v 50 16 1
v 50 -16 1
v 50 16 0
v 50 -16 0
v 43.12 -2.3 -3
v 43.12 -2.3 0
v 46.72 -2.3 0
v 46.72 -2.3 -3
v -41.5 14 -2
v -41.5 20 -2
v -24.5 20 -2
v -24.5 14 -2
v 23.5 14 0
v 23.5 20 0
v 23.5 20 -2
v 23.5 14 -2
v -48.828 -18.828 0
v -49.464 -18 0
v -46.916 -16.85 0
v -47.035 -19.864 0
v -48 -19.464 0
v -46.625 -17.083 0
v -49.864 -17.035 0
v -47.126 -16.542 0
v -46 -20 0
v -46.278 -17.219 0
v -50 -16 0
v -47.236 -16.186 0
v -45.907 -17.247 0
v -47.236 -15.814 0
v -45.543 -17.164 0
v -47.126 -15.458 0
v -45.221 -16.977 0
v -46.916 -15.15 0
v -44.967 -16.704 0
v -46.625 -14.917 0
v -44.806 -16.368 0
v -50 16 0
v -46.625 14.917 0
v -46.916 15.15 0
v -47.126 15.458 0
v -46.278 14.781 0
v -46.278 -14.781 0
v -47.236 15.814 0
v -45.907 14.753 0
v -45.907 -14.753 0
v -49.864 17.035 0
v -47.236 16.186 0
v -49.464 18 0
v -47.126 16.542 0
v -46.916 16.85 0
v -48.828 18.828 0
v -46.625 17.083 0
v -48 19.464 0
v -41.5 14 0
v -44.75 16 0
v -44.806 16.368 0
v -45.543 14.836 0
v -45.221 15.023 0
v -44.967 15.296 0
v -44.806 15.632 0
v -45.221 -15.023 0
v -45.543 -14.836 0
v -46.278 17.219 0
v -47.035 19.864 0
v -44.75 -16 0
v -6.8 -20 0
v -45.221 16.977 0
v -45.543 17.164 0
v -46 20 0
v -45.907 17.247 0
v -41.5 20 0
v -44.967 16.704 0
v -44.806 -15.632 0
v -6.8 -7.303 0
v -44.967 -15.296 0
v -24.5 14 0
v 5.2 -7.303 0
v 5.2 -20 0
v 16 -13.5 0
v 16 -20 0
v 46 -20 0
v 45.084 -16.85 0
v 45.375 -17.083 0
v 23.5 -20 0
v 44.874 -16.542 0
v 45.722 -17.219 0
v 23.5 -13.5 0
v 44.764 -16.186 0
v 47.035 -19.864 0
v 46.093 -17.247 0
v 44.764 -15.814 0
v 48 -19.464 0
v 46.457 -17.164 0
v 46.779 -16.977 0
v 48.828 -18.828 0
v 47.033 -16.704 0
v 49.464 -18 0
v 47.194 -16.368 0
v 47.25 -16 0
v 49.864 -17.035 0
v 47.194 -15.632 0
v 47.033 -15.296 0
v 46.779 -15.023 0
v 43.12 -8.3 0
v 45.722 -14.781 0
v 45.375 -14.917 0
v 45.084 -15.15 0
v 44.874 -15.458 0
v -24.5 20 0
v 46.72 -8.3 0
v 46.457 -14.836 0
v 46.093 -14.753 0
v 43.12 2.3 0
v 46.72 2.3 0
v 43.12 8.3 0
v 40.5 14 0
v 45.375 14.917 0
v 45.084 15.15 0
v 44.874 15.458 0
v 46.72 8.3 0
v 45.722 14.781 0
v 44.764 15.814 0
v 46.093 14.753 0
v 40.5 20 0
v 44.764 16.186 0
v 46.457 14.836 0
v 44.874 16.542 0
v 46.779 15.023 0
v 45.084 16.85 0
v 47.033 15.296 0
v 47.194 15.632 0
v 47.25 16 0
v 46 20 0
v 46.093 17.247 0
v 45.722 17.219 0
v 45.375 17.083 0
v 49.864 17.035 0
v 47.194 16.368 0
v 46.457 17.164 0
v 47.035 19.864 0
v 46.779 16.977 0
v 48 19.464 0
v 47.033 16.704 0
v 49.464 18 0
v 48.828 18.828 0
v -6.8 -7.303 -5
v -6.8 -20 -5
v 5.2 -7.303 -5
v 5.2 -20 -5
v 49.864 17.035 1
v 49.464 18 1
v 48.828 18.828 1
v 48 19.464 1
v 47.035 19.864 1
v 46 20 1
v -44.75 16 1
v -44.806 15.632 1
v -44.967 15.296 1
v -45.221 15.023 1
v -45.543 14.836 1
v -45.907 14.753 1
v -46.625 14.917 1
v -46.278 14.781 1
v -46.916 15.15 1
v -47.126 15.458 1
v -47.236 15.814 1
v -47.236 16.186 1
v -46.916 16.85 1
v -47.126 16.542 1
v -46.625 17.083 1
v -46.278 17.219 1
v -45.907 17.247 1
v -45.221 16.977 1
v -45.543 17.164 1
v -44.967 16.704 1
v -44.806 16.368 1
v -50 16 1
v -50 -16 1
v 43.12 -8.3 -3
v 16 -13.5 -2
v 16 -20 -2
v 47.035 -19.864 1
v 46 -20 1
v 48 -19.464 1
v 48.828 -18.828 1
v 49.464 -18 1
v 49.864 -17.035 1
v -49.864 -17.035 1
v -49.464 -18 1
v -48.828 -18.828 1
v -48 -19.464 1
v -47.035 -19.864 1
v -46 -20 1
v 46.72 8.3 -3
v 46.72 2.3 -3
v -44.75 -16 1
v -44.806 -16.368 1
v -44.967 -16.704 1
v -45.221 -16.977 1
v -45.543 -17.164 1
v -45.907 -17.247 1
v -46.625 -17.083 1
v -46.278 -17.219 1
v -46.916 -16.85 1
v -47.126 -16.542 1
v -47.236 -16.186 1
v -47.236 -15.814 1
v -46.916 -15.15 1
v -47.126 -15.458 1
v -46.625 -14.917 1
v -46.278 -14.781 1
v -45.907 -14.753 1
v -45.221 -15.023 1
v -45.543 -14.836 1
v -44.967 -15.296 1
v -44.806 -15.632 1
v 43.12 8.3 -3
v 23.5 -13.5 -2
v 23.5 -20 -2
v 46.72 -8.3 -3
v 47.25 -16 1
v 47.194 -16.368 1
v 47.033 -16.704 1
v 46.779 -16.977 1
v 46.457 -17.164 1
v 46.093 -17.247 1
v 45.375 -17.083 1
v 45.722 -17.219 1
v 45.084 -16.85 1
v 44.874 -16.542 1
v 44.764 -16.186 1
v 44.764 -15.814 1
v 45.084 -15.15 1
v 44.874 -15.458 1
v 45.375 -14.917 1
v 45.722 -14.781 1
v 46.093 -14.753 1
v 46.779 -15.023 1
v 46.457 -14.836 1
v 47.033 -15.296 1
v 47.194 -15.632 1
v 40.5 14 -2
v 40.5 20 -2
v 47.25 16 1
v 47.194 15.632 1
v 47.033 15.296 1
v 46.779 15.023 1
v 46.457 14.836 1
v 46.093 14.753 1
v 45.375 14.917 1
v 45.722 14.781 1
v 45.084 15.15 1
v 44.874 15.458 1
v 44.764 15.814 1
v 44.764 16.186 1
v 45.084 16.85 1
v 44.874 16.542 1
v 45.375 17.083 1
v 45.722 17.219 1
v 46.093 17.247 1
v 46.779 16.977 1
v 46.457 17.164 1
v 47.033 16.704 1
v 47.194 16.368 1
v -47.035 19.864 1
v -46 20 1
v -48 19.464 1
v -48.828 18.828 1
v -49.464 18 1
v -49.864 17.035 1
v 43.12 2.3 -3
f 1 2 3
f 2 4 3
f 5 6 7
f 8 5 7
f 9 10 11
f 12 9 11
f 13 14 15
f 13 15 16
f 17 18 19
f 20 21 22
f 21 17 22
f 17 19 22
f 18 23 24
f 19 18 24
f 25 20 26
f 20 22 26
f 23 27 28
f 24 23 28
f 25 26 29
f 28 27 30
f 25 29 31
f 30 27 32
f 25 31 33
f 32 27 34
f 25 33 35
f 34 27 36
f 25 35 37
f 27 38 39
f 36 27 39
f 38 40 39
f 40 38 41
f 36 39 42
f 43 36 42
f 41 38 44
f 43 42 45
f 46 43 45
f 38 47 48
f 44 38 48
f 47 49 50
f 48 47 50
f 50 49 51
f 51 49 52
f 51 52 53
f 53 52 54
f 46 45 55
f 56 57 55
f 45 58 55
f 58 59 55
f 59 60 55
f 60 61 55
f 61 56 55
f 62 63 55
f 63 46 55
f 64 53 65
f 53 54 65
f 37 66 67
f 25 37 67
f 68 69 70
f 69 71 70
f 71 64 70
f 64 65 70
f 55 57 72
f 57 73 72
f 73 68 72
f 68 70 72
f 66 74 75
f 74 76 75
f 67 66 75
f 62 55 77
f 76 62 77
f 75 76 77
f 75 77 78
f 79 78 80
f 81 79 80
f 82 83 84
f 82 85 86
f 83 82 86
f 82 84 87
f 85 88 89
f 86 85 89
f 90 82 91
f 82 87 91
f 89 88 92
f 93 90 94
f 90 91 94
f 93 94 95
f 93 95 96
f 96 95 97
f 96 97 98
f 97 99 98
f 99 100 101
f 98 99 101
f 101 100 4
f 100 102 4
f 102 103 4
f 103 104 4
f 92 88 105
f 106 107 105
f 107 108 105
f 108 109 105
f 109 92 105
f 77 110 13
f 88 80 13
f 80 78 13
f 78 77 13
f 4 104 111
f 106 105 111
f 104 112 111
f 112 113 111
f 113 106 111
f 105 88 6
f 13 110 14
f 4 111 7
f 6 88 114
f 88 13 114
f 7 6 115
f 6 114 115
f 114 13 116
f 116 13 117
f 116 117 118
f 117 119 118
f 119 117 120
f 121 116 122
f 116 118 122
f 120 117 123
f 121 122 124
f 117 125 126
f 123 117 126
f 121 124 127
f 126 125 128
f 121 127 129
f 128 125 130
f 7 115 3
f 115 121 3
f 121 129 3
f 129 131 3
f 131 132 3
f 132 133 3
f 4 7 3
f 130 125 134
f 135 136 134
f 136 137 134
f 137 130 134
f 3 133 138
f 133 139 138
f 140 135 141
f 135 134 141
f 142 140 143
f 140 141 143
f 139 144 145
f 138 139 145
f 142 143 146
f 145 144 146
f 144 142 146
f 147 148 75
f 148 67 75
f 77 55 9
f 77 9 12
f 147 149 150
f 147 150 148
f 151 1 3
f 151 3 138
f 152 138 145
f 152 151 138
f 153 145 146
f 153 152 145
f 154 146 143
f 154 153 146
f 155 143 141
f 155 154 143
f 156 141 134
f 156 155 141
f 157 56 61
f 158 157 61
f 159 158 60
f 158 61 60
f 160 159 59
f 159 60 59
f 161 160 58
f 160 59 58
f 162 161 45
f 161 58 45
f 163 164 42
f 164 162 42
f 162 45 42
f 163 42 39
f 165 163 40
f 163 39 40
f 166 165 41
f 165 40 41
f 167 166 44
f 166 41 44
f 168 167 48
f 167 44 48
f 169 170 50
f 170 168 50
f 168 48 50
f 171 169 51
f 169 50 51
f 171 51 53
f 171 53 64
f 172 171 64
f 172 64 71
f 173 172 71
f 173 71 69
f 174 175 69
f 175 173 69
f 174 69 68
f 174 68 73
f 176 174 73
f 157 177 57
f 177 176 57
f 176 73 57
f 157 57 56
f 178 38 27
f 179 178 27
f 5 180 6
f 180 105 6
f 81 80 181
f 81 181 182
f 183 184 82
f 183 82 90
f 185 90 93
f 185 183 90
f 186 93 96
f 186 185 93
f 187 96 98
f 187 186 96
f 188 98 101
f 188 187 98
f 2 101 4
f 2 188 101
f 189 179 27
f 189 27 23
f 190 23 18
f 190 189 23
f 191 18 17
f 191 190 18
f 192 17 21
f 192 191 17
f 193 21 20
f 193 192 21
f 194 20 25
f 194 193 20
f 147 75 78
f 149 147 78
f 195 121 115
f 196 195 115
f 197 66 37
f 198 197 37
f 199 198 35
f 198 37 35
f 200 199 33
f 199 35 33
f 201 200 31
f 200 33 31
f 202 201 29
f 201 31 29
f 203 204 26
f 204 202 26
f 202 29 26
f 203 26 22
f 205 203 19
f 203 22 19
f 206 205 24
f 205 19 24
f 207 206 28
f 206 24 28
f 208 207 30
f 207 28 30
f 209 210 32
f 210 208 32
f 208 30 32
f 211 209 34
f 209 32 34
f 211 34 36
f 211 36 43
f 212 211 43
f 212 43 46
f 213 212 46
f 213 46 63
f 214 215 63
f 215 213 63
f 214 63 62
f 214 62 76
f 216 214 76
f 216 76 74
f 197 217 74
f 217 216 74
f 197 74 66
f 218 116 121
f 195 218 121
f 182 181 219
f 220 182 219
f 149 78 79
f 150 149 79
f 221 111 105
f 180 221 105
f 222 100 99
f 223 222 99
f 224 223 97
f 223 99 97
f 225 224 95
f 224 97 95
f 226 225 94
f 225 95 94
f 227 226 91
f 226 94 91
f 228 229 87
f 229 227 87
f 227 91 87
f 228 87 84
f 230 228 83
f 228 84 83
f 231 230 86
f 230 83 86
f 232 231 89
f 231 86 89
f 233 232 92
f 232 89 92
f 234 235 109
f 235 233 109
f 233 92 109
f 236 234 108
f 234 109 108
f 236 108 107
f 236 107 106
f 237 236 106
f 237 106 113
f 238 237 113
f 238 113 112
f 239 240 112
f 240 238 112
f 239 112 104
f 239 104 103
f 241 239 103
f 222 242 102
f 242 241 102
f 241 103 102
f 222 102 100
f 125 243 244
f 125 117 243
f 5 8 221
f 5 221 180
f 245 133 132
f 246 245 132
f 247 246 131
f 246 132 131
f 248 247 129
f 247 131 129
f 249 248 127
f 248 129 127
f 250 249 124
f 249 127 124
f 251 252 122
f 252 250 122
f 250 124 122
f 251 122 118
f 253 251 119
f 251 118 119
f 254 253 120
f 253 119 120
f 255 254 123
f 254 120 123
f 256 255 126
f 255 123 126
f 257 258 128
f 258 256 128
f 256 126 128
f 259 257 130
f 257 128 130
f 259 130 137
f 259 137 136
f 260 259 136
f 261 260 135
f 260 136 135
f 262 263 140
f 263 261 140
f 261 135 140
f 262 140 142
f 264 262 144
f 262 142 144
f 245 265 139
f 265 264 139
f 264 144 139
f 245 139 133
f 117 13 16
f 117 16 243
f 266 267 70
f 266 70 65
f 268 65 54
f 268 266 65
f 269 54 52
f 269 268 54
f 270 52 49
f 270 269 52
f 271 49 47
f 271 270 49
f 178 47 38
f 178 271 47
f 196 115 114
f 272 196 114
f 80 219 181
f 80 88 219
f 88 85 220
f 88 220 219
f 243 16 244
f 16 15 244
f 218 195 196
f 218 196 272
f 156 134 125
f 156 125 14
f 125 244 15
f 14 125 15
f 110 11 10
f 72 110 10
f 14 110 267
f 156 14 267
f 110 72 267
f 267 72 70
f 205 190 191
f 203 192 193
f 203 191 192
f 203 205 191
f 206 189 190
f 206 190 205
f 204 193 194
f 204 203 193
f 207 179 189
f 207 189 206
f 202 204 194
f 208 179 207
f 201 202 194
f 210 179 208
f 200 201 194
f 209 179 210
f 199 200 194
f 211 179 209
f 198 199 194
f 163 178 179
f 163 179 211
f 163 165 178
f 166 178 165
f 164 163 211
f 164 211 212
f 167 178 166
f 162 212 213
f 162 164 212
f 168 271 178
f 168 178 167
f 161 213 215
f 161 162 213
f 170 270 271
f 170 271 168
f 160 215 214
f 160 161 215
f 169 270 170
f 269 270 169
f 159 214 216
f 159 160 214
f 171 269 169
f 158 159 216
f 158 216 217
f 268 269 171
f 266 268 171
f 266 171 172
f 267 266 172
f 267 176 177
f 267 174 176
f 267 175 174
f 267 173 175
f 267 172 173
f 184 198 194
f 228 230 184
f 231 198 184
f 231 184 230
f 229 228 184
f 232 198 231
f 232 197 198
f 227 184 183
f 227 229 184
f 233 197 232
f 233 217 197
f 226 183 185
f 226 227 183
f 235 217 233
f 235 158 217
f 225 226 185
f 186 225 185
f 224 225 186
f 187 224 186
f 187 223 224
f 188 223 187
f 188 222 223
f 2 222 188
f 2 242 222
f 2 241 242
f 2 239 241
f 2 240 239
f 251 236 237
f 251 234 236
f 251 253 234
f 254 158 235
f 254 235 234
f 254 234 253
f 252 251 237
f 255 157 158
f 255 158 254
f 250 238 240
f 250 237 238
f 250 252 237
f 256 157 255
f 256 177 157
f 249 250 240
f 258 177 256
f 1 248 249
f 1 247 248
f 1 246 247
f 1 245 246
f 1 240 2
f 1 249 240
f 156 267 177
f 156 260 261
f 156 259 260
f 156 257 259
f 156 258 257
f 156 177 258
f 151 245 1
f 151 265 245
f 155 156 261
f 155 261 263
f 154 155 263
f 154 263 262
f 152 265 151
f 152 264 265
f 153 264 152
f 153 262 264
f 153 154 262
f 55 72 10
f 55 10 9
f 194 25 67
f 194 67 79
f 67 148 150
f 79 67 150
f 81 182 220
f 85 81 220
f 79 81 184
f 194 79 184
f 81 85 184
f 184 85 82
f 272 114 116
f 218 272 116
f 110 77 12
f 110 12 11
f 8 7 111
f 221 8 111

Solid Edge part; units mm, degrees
sketch "Sketch1" plane through (0, 0, 0) normal (0, 0, 1) x (1, 0, 0)
  line L0 (-50, -20) -> (50, -20)
  line L1 (50, -20) -> (50, 20)
  line L2 (50, 20) -> (-50, 20)
  line L3 (-50, 20) -> (-50, -20)
  circle A0 centre (-46, -16) radius 1.25
  circle A1 centre (-46, 16) radius 1.25
  circle A2 centre (46, 16) radius 1.25
  circle A3 centre (46, -16) radius 1.25
  dimension "D1" = 40
  dimension "D2" = 100
  dimension "D3" = 2.5
  dimension "D4" = 92
  dimension "D5" = 32
extrude "Protrusion1" add sketch "Sketch1" along normal blind 1
fillet "Round_1" radius 4 4 edges at (-50, -20, 0.5) (-50, 20, 0.5) (50, -20, 0.5) (50, 20, 0.5)
sketch "Sketch2" plane through (0, 0, 0) normal (0, 0, 1) x (1, 0, 0)
  line L0 (-24.5, 14) -> (-24.5, 20)
  line L1 (-24.5, 20) -> (-41.5, 20)
  line L2 (-41.5, 20) -> (-41.5, 14)
  line L3 (-41.5, 14) -> (-24.5, 14)
  line L4 (23.5, 20) -> (23.5, 14)
  line L5 (23.5, 14) -> (40.5, 14)
  line L6 (40.5, 14) -> (40.5, 20)
  line L7 (40.5, 20) -> (23.5, 20)
  dimension "D1" = 17
  dimension "D2" = 8.5
  dimension "D3" = 9.5
  dimension "D4" = 6
  dimension "D5" = 5.08
  dimension "D6" = 3.6
  dimension "D7" = 6
  dimension "D8" = 11.7
  dimension "D9" = 26.5
  dimension "D10" = 7.5
  dimension "D11" = 6.5
  dimension "D12" = 12
  dimension "D13" = 44.8
extrude "ExtrudedProtrusion_2" add sketch "Sketch2" against normal blind 2
sketch "Sketch3" plane through (0, 0, 0) normal (0, 0, 1) x (1, 0, 0)
  line L0 (5.2, -7.3029) -> (5.2, -20)
  line L1 (5.2, -20) -> (-6.8, -20)
  line L2 (-6.8, -20) -> (-6.8, -7.3029)
  line L3 (-6.8, -7.3029) -> (5.2, -7.3029)
extrude "ExtrudedProtrusion_3" add sketch "Sketch3" against normal blind 5
sketch "Sketch4" plane through (0, 0, 0) normal (0, 0, 1) x (1, 0, 0)
  line L0 (23.5, -20) -> (23.5, -13.5)
  line L1 (23.5, -13.5) -> (16, -13.5)
  line L2 (16, -13.5) -> (16, -20)
  line L3 (16, -20) -> (23.5, -20)
extrude "ExtrudedProtrusion_4" add sketch "Sketch4" against normal blind 2
sketch "Sketch5" plane through (0, 0, 0) normal (0, 0, 1) x (1, 0, 0)
  line L0 (46.72, -2.3) -> (46.72, -8.3)
  line L1 (46.72, -8.3) -> (43.12, -8.3)
  line L2 (43.12, -8.3) -> (43.12, -2.3)
  line L3 (43.12, -2.3) -> (46.72, -2.3)
  line L4 (46.72, 8.3) -> (46.72, 2.3)
  line L5 (46.72, 2.3) -> (43.12, 2.3)
  line L6 (43.12, 2.3) -> (43.12, 8.3)
  line L7 (43.12, 8.3) -> (46.72, 8.3)
  dimension "D1" = 17
  dimension "D2" = 8.5
  dimension "D3" = 9.5
  dimension "D4" = 6
  dimension "D5" = 5.08
  dimension "D6" = 3.6
  dimension "D7" = 6
  dimension "D8" = 11.7
  dimension "D9" = 26.5
  dimension "D10" = 7.5
  dimension "D11" = 6.5
  dimension "D12" = 12
  dimension "D13" = 44.8
extrude "ExtrudedProtrusion_5" add sketch "Sketch5" against normal blind 3
